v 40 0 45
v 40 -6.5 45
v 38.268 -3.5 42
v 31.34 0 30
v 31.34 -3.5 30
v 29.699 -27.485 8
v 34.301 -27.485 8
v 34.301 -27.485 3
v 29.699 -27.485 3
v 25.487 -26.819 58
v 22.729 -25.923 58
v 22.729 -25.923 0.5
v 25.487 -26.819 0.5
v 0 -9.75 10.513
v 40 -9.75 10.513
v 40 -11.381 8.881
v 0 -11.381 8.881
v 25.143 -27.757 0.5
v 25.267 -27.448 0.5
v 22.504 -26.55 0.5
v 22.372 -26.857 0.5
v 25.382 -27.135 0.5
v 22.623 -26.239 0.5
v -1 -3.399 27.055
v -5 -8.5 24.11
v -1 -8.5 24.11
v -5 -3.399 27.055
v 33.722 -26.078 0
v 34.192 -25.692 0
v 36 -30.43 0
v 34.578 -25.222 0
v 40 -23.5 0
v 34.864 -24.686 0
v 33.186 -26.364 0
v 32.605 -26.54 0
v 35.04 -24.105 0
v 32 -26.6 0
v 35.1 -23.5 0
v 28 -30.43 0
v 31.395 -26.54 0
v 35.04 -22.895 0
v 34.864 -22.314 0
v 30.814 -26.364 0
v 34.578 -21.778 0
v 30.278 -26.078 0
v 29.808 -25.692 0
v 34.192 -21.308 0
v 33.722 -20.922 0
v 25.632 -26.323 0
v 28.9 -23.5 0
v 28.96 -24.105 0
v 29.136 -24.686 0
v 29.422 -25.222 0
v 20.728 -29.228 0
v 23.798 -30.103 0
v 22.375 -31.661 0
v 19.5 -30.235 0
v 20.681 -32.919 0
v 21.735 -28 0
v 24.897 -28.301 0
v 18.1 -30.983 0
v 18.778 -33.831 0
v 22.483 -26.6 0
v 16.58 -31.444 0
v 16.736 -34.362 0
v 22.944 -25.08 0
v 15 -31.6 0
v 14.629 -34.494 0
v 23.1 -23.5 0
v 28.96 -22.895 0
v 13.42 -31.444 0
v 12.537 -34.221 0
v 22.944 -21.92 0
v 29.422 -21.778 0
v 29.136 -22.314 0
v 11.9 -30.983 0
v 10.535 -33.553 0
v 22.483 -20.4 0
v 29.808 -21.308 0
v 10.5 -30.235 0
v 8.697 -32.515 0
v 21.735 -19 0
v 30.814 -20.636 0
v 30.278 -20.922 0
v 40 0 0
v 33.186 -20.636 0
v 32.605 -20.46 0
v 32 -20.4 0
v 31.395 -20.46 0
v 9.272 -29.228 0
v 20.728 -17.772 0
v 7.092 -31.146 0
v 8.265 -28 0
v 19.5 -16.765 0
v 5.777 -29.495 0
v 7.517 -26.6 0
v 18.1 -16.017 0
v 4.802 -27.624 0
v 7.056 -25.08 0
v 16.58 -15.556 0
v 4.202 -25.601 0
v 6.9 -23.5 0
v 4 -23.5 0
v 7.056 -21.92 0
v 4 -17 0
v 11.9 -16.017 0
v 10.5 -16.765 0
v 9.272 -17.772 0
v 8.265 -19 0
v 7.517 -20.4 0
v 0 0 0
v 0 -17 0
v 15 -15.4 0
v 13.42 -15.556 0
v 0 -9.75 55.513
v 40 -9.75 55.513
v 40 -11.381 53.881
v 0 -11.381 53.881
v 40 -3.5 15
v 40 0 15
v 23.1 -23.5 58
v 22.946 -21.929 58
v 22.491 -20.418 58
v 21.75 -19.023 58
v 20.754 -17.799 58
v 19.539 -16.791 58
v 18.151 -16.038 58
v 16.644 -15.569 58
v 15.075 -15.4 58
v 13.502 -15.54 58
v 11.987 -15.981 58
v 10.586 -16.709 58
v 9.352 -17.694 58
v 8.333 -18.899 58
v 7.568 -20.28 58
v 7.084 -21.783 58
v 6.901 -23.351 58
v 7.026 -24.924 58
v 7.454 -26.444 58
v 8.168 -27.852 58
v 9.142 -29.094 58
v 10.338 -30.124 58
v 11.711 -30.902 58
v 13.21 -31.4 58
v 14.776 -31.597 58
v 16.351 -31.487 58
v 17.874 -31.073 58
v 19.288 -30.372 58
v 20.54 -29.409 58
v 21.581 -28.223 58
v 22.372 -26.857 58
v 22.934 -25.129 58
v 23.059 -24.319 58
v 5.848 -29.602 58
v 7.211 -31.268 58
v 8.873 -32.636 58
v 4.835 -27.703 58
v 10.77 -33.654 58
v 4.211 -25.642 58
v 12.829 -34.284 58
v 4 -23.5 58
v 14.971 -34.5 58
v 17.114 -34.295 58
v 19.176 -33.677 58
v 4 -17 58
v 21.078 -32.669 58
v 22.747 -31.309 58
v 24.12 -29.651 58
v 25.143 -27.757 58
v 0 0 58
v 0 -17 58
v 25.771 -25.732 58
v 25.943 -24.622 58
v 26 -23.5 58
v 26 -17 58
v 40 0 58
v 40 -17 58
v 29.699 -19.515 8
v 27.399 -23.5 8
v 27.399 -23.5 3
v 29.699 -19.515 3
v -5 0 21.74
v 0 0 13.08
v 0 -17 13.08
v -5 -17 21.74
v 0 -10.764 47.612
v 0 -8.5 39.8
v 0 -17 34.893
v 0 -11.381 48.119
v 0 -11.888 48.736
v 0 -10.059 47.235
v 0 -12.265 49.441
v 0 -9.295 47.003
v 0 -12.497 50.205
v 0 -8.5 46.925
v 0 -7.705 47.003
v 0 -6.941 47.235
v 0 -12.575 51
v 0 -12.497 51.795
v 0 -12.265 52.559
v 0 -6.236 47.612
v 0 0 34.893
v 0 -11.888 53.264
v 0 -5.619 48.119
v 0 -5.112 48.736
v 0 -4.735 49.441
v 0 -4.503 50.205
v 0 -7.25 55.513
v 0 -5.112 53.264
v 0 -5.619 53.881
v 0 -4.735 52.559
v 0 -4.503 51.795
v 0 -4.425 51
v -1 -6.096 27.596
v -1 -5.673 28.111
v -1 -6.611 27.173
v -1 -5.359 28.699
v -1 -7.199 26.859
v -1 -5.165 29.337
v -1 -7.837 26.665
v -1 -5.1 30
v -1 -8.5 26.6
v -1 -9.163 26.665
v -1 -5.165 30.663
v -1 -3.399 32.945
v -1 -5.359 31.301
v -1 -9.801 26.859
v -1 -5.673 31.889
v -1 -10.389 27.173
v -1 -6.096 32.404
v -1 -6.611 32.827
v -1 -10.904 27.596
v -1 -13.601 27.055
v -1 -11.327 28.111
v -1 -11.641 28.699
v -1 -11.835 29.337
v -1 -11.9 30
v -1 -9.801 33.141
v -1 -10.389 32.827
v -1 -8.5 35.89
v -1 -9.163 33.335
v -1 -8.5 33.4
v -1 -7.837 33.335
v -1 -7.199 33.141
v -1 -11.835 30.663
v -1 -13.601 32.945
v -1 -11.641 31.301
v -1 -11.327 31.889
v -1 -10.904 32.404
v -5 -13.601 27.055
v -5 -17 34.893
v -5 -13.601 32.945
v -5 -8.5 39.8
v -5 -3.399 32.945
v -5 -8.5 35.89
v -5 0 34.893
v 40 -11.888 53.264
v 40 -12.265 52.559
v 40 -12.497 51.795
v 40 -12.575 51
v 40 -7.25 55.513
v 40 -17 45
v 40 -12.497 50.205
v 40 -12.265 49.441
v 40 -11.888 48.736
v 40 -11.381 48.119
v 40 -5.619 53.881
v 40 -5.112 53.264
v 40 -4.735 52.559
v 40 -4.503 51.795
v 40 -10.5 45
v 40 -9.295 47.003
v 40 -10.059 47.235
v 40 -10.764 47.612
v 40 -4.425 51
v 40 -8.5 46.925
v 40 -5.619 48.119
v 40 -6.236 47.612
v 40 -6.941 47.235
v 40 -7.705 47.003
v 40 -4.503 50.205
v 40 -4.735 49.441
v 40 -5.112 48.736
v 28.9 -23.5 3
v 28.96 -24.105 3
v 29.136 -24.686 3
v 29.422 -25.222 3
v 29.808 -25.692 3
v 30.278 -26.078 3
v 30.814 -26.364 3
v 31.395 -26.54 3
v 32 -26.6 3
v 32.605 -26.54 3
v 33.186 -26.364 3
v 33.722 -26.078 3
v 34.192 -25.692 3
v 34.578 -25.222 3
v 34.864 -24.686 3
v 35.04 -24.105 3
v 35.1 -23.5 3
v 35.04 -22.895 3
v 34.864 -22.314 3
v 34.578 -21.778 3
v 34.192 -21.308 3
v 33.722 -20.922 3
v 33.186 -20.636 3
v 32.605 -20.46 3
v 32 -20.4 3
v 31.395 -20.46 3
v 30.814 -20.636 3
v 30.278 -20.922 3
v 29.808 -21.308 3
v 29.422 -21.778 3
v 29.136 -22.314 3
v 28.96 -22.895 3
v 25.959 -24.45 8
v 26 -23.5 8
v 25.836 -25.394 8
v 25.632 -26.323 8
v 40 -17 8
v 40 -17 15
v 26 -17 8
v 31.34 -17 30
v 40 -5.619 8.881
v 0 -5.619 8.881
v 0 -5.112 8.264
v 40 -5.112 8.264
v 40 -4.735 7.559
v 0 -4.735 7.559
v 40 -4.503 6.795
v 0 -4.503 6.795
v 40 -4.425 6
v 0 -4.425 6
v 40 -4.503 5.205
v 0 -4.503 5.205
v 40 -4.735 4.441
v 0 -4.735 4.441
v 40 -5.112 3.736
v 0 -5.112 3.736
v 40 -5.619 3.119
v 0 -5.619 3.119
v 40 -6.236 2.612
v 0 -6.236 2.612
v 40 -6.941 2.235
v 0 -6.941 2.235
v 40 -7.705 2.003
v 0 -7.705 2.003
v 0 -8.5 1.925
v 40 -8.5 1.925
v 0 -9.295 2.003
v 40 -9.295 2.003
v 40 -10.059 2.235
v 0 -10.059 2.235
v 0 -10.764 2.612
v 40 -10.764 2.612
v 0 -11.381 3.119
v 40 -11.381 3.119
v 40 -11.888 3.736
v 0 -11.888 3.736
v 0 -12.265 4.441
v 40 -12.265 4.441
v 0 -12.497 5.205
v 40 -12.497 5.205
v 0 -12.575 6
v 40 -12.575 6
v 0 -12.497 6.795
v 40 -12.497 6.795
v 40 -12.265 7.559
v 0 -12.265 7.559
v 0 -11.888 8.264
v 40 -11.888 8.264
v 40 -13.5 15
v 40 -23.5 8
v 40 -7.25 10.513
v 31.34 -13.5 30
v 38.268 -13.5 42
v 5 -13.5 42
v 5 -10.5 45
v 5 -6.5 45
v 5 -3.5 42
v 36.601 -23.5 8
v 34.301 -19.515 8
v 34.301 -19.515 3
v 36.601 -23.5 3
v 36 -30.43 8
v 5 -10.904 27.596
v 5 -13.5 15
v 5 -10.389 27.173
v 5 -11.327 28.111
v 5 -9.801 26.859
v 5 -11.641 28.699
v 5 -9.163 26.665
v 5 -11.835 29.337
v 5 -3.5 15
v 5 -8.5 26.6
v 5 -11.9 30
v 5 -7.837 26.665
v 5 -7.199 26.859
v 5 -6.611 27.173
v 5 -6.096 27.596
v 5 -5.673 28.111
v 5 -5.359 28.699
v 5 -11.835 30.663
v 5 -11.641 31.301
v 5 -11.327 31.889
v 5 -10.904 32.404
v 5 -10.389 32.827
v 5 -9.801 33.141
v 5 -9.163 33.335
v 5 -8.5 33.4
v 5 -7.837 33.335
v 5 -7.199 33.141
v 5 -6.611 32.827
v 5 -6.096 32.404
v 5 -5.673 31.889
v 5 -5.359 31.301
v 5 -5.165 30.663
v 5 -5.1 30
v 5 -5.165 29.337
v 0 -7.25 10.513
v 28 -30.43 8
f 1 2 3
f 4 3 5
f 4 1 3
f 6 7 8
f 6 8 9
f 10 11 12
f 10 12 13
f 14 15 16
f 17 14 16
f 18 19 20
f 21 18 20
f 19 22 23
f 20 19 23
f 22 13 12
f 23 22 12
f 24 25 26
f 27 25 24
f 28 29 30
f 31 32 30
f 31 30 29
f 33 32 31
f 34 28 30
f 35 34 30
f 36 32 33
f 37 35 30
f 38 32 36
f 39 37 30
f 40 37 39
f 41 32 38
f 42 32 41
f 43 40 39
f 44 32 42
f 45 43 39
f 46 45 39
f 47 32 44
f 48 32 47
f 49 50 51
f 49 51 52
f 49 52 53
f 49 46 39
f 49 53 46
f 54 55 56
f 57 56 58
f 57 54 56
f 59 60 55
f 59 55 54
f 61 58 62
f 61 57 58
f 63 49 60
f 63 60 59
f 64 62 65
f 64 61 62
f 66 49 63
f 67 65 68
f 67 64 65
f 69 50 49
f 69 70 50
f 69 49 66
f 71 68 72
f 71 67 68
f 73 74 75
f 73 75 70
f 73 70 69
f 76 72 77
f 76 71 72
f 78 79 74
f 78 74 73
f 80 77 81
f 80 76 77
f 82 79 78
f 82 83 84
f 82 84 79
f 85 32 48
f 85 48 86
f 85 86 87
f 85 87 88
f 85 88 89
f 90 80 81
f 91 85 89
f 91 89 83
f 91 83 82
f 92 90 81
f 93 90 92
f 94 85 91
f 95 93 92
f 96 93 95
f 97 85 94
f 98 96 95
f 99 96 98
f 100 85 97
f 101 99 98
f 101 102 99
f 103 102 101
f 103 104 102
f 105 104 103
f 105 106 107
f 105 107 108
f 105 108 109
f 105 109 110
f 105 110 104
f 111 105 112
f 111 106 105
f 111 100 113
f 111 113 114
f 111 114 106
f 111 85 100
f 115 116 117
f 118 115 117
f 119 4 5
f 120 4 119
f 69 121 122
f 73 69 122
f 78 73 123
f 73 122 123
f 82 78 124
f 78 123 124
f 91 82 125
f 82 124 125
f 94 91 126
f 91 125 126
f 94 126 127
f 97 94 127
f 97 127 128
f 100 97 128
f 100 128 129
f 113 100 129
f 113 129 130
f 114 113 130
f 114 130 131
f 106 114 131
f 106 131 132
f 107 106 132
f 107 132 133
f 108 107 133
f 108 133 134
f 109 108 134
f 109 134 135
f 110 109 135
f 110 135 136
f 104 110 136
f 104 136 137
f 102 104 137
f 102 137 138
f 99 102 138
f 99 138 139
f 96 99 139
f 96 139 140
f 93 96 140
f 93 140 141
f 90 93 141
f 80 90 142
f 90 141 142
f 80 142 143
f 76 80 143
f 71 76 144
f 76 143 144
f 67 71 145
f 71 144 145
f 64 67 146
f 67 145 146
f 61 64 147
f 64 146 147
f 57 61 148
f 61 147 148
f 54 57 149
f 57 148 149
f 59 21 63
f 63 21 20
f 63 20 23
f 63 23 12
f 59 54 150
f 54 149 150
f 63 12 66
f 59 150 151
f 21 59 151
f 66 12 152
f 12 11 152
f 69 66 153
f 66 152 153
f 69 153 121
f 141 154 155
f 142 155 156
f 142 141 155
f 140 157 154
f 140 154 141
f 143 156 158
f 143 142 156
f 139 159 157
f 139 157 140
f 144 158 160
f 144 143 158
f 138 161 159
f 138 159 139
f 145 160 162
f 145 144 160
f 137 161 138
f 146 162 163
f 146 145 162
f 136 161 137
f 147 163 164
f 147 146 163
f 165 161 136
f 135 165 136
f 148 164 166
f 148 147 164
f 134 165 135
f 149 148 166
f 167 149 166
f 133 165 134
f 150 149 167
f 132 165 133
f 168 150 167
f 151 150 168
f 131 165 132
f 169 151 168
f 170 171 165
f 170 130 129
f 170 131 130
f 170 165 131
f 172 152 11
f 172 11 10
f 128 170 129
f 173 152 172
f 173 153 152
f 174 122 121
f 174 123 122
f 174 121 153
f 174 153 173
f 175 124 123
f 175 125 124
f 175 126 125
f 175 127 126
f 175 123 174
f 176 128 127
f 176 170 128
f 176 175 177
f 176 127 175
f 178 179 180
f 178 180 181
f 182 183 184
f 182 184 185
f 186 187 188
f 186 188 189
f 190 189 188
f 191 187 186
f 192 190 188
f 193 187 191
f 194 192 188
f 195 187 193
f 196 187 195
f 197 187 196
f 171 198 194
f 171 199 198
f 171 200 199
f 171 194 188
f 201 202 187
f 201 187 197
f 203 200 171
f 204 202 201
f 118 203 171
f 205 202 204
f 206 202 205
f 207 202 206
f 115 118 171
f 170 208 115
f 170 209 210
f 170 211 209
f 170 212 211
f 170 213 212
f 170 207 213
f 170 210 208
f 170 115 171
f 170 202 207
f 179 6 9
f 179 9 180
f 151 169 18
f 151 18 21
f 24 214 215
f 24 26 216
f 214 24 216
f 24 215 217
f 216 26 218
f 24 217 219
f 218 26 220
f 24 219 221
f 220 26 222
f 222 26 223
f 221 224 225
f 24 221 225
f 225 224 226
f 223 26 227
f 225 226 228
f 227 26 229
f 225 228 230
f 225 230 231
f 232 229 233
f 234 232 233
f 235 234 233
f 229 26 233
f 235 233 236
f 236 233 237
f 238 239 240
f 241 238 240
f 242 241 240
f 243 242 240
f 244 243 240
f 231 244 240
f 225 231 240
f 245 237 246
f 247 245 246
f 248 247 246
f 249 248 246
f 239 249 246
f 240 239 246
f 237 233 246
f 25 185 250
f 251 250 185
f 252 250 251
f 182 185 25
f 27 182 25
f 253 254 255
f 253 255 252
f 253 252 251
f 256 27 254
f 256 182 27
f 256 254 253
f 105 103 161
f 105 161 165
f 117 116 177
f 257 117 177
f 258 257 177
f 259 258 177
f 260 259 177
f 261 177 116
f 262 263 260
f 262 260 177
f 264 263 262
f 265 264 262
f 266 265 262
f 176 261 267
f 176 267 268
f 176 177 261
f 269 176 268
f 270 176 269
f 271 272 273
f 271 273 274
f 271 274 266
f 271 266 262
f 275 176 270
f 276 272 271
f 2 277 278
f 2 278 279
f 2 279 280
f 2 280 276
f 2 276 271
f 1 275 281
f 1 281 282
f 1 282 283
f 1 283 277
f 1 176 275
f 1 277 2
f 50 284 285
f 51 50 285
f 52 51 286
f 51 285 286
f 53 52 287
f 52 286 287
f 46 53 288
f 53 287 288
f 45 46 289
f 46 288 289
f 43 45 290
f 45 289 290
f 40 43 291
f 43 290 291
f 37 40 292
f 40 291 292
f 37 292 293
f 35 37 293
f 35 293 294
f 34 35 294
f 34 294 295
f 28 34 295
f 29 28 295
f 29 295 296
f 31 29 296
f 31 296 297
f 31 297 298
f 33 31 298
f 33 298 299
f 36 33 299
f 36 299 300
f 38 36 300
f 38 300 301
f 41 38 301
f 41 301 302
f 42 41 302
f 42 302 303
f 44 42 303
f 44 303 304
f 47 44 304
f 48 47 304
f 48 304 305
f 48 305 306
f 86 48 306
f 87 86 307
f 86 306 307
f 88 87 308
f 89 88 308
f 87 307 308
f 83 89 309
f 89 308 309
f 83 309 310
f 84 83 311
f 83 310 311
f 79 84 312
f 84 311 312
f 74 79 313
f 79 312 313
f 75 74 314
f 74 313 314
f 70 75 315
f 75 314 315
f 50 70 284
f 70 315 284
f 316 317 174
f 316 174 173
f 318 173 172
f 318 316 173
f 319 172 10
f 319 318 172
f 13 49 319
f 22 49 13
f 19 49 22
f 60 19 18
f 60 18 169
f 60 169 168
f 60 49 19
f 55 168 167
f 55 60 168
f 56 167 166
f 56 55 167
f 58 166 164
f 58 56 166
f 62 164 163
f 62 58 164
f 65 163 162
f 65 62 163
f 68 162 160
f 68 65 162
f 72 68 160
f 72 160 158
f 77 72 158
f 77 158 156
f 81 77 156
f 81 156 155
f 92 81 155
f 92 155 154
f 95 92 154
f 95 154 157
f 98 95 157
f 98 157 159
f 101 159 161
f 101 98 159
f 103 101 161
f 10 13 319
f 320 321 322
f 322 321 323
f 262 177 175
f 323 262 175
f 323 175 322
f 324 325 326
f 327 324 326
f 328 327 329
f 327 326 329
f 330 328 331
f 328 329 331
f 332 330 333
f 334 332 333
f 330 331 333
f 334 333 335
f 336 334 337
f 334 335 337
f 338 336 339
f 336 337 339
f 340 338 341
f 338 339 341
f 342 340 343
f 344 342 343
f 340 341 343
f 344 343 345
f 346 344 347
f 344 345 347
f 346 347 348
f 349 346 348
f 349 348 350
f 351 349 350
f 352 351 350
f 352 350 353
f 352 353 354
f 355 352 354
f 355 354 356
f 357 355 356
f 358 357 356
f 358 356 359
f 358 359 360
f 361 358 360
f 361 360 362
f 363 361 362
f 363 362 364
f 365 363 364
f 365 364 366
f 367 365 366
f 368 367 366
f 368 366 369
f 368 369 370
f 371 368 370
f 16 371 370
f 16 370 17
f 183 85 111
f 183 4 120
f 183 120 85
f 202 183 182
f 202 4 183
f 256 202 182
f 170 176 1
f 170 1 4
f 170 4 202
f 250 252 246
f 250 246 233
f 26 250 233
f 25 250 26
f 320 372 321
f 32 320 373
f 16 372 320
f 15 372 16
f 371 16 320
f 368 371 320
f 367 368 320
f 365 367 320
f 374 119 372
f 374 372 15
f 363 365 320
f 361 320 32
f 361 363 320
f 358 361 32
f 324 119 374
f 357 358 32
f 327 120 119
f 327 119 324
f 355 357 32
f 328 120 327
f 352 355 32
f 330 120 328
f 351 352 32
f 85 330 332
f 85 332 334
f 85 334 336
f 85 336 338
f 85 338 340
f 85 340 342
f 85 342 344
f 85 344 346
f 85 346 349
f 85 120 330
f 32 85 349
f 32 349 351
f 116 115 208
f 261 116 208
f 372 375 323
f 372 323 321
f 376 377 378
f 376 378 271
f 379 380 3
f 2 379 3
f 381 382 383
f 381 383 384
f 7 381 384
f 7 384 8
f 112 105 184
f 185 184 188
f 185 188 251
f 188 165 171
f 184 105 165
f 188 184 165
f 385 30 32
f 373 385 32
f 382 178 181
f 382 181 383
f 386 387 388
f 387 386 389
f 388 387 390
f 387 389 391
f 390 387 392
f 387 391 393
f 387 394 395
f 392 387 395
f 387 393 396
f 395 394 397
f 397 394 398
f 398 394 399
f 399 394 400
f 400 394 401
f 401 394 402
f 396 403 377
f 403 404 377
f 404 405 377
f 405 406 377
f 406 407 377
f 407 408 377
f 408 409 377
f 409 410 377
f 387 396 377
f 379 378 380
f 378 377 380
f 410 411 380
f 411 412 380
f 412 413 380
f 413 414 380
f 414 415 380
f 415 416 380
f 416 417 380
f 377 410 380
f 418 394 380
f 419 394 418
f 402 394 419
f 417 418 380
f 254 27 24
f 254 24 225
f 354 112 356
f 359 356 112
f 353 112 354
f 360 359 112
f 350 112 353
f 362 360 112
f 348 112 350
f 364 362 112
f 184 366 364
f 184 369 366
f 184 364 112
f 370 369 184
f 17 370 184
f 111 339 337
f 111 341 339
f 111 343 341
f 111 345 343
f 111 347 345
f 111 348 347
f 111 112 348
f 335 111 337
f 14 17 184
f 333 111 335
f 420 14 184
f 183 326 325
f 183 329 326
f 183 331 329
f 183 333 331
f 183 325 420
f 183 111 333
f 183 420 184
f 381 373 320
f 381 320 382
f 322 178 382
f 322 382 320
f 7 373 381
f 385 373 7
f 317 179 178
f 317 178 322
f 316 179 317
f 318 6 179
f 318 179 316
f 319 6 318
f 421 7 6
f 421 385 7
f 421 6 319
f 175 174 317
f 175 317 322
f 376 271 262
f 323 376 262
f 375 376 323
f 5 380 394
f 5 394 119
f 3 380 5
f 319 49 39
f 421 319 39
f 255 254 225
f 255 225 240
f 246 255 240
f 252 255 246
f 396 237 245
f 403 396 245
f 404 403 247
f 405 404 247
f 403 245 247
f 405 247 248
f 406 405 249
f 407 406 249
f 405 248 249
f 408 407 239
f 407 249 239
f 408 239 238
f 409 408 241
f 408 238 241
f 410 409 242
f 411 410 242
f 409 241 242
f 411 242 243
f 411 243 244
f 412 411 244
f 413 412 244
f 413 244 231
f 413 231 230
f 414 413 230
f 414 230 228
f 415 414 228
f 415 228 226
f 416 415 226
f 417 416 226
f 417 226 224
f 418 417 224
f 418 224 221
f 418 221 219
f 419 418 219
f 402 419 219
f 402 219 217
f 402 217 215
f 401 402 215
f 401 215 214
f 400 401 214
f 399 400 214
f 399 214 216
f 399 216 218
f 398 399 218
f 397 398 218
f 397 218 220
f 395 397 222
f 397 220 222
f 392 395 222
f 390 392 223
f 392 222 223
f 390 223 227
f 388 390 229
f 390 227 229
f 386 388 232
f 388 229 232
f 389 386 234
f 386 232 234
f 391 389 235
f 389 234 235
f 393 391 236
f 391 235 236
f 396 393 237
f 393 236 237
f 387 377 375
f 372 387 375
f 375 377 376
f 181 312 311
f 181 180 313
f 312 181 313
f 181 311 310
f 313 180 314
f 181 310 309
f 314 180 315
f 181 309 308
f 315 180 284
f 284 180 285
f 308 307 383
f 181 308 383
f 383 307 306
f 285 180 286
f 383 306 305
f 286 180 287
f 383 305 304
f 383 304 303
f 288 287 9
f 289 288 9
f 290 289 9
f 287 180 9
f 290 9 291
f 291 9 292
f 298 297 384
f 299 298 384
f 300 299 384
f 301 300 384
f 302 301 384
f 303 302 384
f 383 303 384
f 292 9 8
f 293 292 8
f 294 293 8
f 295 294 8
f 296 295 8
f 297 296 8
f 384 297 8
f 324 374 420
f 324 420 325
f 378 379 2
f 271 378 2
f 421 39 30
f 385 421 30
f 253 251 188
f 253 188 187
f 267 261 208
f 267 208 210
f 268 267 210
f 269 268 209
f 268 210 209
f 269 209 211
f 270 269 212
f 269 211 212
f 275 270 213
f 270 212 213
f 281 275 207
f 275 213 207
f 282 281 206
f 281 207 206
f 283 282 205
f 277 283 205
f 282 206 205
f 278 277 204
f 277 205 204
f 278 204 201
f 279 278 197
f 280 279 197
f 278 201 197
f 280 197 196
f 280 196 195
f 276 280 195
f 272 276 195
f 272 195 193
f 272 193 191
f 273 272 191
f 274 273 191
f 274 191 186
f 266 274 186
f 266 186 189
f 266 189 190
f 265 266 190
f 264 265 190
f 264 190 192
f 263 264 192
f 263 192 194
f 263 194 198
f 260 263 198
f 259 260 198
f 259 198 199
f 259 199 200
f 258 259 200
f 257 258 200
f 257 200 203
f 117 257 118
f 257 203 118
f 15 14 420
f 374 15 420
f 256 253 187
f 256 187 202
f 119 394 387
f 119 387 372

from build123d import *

# Parameters (mm, degrees)
SKETCH011_W     = 40
SKETCH011_H     = 30
PAD003_DEPTH    = 10
CHAMFER_SIZE    = 3
PAD_DEPTH       = 17
POCKET_DEPTH    = 5
POCKET001_DEPTH = 4
POCKET002_DEPTH = 40.001
POCKET003_DEPTH = 40.001
PAD001_DEPTH    = 58
PAD002_DEPTH    = 8
POCKET004_DEPTH = 5
SKETCH010_R     = 3.1
POCKET005_DEPTH = 8.001
SKETCH005_R     = 3.4
POCKET006_DEPTH = 41.001
SKETCH012_R     = 8.1
POCKET007_DEPTH = 58.001
POCKET008_DEPTH = 57.5


with BuildPart() as inner_part:
    # Sketch011 → Pad003 (new body)
    with BuildSketch(Plane.XZ.offset(3.5)):
        with Locations((25, 30)):
            Rectangle(SKETCH011_W, SKETCH011_H)
    extrude(amount=PAD003_DEPTH)

    # Chamfer
    chamfer_edges = [inner_part.edges().sort_by_distance(p)[0] for p in [
        (25, -3.5, 45),
        (25, -13.5, 45),
    ]]
    chamfer(chamfer_edges, length=CHAMFER_SIZE)


with BuildPart() as rod_guide_slot:
    # Sketch → Pad (new body)
    with BuildSketch(Plane.XZ):
        Polygon((0, 0), (0, 13.079746), (-5, 21.74), (-5, 39.8), (0, 39.8), (0, 58), (40, 58), (40, 45), (31.339746, 30), (40, 15), (40, 0), align=None)
    extrude(amount=PAD_DEPTH)

    # Sketch001 → Pocket (cut)
    with BuildSketch(Plane(origin=(-5, 0, 0), x_dir=(0, 0, -1), z_dir=(-1, 0, 0))):
        Polygon((-34.892523, 17), (-39.8, 8.5), (-34.892523, 0), (-42.892523, 0), (-42.892523, 17), align=None)
    extrude(amount=-POCKET_DEPTH, mode=Mode.SUBTRACT)

    # Sketch002 → Pocket001 (cut)
    with BuildSketch(Plane(origin=(-5, 0, 0), x_dir=(0, 0, -1), z_dir=(-1, 0, 0))):
        Polygon((-35.89, 8.5), (-32.945, 13.60089), (-27.055, 13.60089), (-24.11, 8.5), (-27.055, 3.39911), (-32.945, 3.39911), align=None)
    extrude(amount=-POCKET001_DEPTH, mode=Mode.SUBTRACT)

    # Sketch003 → Pocket002 (cut, through all)
    with BuildSketch(Plane(origin=(0, 0, 0), x_dir=(0, 0, -1), z_dir=(-1, 0, 0))):
        with BuildLine():
            Line((-55.51292, 9.75), (-55.51292, 7.25))
            Line((-55.51292, 7.25), (-53.88146, 5.61854))
            ThreePointArc((-53.88146, 5.61854), (-46.925, 8.5), (-53.88146, 11.38146))
            Line((-55.51292, 9.75), (-53.88146, 11.38146))
        make_face()
    extrude(amount=-POCKET002_DEPTH, mode=Mode.SUBTRACT)

    # Sketch004 → Pocket003 (cut, through all)
    with BuildSketch(Plane(origin=(0, 0, 0), x_dir=(0, 0, -1), z_dir=(-1, 0, 0))):
        with BuildLine():
            Line((-10.51292, 9.75), (-10.51292, 7.25))
            Line((-10.51292, 7.25), (-8.88146, 5.61854))
            ThreePointArc((-8.88146, 5.61854), (-1.925, 8.5), (-8.88146, 11.38146))
            Line((-10.51292, 9.75), (-8.88146, 11.38146))
        make_face()
    extrude(amount=-POCKET003_DEPTH, mode=Mode.SUBTRACT)

    # Sketch006 → Pad001 (new body)
    with BuildSketch(Plane(origin=(0, 0, 0), x_dir=(1, 0, 0), z_dir=(0, 0, -1))):
        with BuildLine():
            Line((4, 23.5), (4, 17))
            Line((4, 17), (26, 17))
            Line((26, 23.5), (26, 17))
            ThreePointArc((26, 23.5), (15, 34.5), (4, 23.5))
        make_face()
    extrude(amount=-PAD001_DEPTH)

    # Sketch007 → Pad002 (new body)
    with BuildSketch(Plane(origin=(0, 0, 0), x_dir=(1, 0, 0), z_dir=(0, 0, -1))):
        Polygon((25.63, 17), (25.63, 26.32), (28, 30.43), (36, 30.43), (40, 23.5), (40, 17), align=None)
    extrude(amount=-PAD002_DEPTH)

    # Sketch009 → Pocket004 (cut)
    with BuildSketch(Plane(origin=(0, 0, 8), x_dir=(-1, 0, 0), z_dir=(0, 0, 1))):
        Polygon((-36.601482, 23.5), (-34.300741, 27.485), (-29.699259, 27.485), (-27.398518, 23.5), (-29.699259, 19.515), (-34.300741, 19.515), align=None)
    extrude(amount=-POCKET004_DEPTH, mode=Mode.SUBTRACT)

    # Sketch010 → Pocket005 (cut, through all)
    with BuildSketch(Plane(origin=(0, 0, 8), x_dir=(-1, 0, 0), z_dir=(0, 0, 1))):
        with Locations((-32, 23.5)):
            Circle(SKETCH010_R)
    extrude(amount=-POCKET005_DEPTH, mode=Mode.SUBTRACT)

    # Cut001: cut inner-part
    add(inner_part.part, mode=Mode.SUBTRACT)

    # Sketch005 → Pocket006 (cut, through all)
    with BuildSketch(Plane(origin=(-1, 0, 0), x_dir=(0, -1, 0), z_dir=(-1, 0, 0))):
        with Locations((8.5, 30)):
            Circle(SKETCH005_R)
    extrude(amount=-POCKET006_DEPTH, mode=Mode.SUBTRACT)

    # Sketch012 → Pocket007 (cut, through all)
    with BuildSketch(Plane.XY.offset(58)):
        with Locations((15, -23.5)):
            Circle(SKETCH012_R)
    extrude(amount=-POCKET007_DEPTH, mode=Mode.SUBTRACT)

    # Sketch013 → Pocket008 (cut)
    with BuildSketch(Plane.XY.offset(58)):
        Polygon((22.127646, -25.72736), (25.627646, -26.864579), (25.627646, -27.914579), (22.127646, -26.77736), align=None)
    extrude(amount=-POCKET008_DEPTH, mode=Mode.SUBTRACT)


solid = rod_guide_slot.part
